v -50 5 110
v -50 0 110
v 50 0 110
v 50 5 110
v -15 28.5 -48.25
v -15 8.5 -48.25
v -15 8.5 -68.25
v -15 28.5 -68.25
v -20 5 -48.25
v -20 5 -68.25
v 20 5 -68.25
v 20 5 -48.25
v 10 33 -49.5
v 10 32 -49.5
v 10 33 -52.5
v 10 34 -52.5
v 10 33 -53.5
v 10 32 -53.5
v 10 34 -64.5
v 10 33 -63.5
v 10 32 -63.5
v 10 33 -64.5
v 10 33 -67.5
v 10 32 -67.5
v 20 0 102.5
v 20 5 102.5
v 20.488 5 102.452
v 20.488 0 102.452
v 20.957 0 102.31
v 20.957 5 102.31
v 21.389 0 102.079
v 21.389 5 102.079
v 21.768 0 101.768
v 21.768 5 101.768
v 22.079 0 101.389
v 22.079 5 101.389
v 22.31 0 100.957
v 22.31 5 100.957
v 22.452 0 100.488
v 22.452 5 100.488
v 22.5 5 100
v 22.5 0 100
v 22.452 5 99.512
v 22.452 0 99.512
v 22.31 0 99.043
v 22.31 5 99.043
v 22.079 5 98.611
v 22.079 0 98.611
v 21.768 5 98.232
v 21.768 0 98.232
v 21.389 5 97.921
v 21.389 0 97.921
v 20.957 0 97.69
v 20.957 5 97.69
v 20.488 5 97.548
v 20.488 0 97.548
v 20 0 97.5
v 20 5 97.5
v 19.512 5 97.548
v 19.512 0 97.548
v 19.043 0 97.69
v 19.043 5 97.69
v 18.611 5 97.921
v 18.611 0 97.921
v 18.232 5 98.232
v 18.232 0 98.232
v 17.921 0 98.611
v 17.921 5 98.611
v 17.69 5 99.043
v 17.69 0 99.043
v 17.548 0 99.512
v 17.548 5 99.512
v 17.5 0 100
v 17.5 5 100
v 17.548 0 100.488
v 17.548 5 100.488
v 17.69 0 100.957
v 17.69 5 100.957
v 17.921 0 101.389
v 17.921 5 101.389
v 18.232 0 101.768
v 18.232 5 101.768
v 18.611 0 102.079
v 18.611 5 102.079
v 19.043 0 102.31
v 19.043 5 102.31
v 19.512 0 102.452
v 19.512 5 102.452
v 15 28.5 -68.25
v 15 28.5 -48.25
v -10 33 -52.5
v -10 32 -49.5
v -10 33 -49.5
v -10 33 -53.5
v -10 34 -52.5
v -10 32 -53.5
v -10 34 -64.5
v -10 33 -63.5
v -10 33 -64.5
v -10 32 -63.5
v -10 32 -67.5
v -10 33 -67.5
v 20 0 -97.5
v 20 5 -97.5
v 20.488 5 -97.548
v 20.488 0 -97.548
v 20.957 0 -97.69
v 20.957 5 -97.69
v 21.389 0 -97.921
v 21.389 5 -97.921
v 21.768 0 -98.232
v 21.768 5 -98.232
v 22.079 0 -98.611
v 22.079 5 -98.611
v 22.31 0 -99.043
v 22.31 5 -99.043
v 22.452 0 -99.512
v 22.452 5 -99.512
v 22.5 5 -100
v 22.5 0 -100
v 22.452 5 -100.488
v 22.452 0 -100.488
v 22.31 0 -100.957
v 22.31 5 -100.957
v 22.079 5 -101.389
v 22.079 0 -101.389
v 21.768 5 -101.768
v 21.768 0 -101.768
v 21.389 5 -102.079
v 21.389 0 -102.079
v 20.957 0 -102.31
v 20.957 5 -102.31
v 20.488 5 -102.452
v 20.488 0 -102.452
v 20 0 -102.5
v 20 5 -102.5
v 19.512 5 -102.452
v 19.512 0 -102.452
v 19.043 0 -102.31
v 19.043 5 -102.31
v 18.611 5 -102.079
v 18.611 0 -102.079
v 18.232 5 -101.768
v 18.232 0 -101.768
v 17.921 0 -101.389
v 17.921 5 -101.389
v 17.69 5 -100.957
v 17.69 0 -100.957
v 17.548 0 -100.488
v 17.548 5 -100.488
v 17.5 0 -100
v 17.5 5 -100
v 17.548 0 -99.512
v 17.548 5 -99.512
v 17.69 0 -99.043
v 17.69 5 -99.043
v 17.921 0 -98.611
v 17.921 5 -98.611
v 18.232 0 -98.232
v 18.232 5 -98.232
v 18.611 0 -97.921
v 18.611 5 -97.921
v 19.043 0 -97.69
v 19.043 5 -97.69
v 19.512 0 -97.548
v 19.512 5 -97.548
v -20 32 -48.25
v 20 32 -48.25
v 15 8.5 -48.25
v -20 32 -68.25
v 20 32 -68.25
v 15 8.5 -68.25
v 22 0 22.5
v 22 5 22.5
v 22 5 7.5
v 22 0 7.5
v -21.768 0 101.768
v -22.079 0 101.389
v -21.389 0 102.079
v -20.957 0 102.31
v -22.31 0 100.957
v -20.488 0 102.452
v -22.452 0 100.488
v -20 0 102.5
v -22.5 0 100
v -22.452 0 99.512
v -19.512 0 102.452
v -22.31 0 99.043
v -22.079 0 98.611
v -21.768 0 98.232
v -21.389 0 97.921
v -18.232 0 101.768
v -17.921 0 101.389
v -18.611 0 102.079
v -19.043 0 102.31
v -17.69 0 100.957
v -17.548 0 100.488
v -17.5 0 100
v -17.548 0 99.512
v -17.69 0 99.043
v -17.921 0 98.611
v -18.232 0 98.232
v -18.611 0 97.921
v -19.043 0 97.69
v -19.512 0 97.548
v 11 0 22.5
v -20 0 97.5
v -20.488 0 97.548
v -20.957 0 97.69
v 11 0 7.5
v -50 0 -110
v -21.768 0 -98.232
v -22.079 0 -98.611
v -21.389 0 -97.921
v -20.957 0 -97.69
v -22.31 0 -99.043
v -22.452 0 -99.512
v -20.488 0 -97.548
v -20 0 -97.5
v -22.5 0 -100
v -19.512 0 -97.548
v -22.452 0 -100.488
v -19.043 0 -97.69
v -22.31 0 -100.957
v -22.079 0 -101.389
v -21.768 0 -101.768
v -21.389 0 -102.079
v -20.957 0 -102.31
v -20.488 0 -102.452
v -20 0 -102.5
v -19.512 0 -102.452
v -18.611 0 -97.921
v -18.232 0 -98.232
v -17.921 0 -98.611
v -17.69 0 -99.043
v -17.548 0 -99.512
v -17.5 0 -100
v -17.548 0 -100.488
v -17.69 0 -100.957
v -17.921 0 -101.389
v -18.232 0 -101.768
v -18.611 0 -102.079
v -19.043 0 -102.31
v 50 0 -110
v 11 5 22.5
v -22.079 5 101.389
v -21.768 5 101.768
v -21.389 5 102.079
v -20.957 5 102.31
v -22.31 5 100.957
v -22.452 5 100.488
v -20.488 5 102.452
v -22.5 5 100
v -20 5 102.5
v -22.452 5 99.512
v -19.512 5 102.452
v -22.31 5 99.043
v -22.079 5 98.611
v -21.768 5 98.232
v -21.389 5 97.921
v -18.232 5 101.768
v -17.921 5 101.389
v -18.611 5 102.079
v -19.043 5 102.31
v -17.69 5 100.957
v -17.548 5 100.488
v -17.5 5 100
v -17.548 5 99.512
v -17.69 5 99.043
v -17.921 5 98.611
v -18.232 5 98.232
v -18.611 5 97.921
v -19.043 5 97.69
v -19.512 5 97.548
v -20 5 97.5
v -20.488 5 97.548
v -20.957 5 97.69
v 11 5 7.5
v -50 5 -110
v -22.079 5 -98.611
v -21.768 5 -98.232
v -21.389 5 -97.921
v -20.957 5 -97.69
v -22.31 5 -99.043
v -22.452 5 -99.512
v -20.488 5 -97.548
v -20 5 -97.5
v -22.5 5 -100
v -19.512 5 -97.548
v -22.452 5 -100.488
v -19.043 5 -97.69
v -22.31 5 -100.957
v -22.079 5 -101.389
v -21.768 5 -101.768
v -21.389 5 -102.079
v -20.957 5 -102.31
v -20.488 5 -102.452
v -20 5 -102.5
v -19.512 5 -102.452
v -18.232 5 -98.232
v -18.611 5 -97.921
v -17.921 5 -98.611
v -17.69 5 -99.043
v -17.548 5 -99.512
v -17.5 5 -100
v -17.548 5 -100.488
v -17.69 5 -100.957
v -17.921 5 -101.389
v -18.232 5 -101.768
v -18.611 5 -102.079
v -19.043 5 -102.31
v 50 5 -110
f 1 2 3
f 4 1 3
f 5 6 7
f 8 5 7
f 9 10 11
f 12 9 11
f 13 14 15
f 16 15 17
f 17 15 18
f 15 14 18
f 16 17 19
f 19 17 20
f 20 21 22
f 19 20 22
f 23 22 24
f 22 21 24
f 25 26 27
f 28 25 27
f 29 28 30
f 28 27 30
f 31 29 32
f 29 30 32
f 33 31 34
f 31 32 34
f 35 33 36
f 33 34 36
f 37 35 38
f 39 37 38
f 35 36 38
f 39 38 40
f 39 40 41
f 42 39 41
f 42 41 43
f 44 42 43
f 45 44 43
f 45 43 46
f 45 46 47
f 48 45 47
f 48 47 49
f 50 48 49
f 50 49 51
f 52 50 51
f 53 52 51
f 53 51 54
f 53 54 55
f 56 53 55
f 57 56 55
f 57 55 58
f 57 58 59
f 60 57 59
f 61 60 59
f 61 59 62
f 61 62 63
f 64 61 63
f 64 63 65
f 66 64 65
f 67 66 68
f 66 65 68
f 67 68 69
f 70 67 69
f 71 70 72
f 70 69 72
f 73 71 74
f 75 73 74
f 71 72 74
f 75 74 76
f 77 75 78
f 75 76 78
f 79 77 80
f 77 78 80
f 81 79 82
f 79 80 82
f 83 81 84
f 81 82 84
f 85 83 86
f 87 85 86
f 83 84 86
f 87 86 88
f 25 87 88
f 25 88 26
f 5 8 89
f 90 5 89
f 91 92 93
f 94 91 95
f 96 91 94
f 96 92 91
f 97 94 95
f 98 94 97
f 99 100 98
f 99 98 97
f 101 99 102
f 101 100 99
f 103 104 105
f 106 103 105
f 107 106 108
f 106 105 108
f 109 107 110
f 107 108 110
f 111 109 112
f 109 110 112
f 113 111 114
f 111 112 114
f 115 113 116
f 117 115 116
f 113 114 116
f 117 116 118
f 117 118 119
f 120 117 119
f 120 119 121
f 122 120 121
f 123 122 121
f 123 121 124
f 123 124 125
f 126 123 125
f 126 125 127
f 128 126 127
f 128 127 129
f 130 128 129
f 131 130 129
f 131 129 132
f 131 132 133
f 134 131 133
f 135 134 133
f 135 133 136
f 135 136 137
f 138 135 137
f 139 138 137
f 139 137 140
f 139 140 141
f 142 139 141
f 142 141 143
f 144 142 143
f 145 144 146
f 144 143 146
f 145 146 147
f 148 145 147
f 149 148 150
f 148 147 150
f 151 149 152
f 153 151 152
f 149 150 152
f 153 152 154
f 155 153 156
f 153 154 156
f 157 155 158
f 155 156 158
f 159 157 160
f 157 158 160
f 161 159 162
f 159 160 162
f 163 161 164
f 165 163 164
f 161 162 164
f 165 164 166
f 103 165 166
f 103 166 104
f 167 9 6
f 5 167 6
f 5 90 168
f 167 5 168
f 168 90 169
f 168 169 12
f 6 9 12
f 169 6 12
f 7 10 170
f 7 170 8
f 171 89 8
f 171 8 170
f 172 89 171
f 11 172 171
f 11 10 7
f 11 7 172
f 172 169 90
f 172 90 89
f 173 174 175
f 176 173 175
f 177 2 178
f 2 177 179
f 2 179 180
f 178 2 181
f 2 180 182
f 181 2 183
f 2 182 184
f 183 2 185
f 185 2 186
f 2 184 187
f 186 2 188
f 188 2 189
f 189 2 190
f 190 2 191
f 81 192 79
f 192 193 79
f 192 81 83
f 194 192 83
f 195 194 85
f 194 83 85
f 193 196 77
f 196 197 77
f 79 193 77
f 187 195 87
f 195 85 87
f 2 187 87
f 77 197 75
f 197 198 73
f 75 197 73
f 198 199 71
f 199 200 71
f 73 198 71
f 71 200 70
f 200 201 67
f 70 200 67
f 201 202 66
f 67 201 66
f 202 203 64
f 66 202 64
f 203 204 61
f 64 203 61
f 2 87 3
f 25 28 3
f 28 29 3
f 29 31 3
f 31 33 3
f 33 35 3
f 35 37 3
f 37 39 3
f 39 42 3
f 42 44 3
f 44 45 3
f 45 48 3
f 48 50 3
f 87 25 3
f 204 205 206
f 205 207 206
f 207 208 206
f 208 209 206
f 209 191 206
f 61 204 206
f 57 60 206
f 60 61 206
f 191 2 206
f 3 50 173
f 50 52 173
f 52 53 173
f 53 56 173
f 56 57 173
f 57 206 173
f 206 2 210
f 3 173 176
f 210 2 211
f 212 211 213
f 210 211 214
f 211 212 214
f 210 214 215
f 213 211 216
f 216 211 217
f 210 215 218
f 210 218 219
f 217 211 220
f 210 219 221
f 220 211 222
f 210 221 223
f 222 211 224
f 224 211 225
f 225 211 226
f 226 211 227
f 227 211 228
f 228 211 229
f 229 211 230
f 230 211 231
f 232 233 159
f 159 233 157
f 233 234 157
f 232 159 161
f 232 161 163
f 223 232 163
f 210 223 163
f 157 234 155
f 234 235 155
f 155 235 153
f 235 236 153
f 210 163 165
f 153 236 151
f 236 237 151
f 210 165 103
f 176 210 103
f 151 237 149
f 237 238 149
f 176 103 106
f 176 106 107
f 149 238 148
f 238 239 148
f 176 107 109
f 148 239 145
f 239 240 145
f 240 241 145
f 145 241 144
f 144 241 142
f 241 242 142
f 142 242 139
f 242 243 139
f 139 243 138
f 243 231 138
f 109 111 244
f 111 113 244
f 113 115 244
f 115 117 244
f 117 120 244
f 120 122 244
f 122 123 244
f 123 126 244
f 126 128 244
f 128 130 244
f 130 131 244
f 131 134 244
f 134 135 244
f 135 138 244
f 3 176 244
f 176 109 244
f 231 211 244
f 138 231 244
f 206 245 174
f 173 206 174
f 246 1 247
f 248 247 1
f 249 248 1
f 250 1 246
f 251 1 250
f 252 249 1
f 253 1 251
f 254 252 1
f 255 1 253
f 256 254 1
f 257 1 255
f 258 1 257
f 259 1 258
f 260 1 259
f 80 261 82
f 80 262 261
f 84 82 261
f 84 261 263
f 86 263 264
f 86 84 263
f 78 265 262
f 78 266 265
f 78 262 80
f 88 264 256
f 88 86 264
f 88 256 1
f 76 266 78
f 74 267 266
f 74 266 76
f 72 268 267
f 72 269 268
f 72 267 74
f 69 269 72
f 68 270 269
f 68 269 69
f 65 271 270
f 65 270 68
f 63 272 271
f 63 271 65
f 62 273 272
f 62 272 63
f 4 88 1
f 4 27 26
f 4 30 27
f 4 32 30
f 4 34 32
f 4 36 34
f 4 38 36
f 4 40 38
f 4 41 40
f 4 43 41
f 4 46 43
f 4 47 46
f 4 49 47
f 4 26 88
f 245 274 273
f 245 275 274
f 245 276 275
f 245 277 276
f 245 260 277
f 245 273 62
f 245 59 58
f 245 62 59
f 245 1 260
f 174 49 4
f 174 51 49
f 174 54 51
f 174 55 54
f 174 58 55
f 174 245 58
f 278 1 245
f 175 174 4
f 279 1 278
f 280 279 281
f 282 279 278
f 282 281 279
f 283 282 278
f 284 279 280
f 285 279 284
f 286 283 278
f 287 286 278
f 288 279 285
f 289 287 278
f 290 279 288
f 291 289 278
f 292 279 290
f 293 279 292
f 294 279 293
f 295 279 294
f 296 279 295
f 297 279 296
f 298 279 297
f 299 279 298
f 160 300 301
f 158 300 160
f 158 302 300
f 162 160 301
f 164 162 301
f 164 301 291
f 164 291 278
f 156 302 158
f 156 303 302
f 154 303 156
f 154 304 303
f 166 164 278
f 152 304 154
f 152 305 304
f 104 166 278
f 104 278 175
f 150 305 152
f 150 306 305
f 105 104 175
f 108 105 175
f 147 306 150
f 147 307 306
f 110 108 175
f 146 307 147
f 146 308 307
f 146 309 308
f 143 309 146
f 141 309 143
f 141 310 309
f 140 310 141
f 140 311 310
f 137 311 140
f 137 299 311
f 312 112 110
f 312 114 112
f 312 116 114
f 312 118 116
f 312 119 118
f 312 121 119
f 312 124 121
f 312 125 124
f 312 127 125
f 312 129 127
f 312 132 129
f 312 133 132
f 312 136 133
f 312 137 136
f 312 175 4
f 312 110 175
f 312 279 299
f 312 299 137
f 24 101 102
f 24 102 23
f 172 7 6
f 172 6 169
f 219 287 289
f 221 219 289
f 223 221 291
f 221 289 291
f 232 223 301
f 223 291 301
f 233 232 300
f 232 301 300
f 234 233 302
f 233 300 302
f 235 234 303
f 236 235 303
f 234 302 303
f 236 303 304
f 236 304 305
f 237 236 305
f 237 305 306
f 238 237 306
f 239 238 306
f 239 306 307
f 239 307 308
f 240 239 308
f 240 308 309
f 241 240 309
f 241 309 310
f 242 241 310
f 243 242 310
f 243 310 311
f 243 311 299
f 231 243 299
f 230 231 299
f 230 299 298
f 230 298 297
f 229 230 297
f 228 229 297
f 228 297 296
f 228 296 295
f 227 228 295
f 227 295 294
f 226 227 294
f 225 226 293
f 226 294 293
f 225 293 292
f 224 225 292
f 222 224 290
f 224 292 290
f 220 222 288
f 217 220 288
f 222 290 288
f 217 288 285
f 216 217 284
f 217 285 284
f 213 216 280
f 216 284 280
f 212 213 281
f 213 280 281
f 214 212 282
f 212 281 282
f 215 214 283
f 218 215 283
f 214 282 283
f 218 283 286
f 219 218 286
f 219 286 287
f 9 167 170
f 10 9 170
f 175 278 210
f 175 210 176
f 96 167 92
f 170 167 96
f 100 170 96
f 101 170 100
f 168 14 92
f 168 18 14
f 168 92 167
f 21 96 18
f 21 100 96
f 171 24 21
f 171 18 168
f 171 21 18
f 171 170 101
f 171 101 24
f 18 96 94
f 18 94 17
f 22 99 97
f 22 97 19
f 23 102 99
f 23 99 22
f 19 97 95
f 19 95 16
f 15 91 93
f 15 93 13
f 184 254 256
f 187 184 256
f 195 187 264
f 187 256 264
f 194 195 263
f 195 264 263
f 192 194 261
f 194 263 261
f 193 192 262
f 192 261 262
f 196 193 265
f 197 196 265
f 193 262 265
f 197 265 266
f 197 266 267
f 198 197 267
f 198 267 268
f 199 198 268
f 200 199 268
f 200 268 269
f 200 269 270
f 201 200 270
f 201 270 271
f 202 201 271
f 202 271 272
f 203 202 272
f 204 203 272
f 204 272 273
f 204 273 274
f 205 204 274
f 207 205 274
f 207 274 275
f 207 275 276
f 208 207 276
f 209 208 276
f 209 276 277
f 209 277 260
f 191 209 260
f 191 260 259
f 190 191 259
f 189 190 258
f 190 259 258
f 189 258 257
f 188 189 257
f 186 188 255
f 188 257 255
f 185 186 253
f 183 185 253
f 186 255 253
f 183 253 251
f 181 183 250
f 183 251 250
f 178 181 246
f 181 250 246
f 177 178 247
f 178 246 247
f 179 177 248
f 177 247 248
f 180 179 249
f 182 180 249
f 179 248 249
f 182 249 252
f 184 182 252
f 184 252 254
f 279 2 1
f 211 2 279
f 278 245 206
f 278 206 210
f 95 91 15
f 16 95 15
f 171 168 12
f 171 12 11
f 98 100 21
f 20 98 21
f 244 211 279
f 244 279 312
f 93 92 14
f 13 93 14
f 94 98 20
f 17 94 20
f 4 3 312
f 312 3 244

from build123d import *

# Parameters (mm, degrees)
SKETCH_1_W                 = 100
SKETCH_1_H                 = 220
EXTRUDE_1_DEPTH            = 5
CUT_EXTRUDE_1_REACH        = 122.934
SKETCH_2_R                 = 2.5
CUT_EXTRUDE_2_REACH        = 122.934
SKETCH_3_W                 = 11
SKETCH_3_H                 = 15
SKETCH_5_W                 = 20
SKETCH_5_H                 = 27
EXTRUDE_2_DEPTH            = 20
EXTRUDE_START              = -10
EXTRUDE_1_2_DEPTH          = 20
CUT_EXTRUDE_3_REACH        = 190.226
SKETCH_7_W                 = 30
SKETCH_7_H                 = 20
SPLIT_START                = 5
SPLIT_BODIES_2_OUTLINE_W   = 40
SPLIT_BODIES_2_OUTLINE_H   = 20
SPLIT_BODIES_2_DEPTH       = 29
SPLIT_BODIES_2_2_OUTLINE_W = 5
SPLIT_BODIES_2_2_OUTLINE_H = 20
SPLIT_BODIES_2_2_DEPTH     = 27
SPLIT_BODIES_2_3_OUTLINE_W = 30
SPLIT_BODIES_2_3_OUTLINE_H = 20
SPLIT_BODIES_2_3_DEPTH     = 3.5
SPLIT_START_2              = 28.5
SPLIT_BODIES_2_4_OUTLINE_W = 30
SPLIT_BODIES_2_4_OUTLINE_H = 20
SPLIT_BODIES_2_4_DEPTH     = 3.5
SPLIT_START_3              = 33
SPLIT_BODIES_2_5_OUTLINE_W = 20
SPLIT_BODIES_2_5_OUTLINE_H = 12
SPLIT_BODIES_2_5_DEPTH     = 1
SPLIT_START_4              = 32
SPLIT_BODIES_2_6_OUTLINE_W = 20
SPLIT_BODIES_2_6_OUTLINE_H = 4
SPLIT_BODIES_2_6_DEPTH     = 1


# Read off the part's stored shape, not the designer's step: 拉伸-薄壁1, 分割2
with BuildPart() as part:
    # 草图1 → Extrude 1 (new body)
    with BuildSketch(Plane(origin=(0, 0, 0), x_dir=(1, 0, 0), z_dir=(0, 1, 0))):
        Rectangle(SKETCH_1_W, SKETCH_1_H)
    extrude(amount=EXTRUDE_1_DEPTH)

    # 草图2 → 切除-拉伸1 (cut, up to next)
    with BuildSketch(Plane(origin=(0, 5, 0), x_dir=(1, 0, 0), z_dir=(0, 1, 0)), mode=Mode.PRIVATE) as cut_extrude_1_sk1:
        with Locations(Location((-20, 100, 0), (0, 0, 270))):
            Circle(SKETCH_2_R)
    cut_extrude_1_tool1 = extrude(cut_extrude_1_sk1.sketch, amount=-CUT_EXTRUDE_1_REACH, mode=Mode.PRIVATE) & part.part
    # 草图2 → 切除-拉伸1 (cut, up to next)
    with BuildSketch(Plane(origin=(0, 5, 0), x_dir=(1, 0, 0), z_dir=(0, 1, 0)), mode=Mode.PRIVATE) as cut_extrude_1_sk2:
        with Locations(Location((-20, -100, 0), (0, 0, 270))):
            Circle(SKETCH_2_R)
    cut_extrude_1_tool2 = extrude(cut_extrude_1_sk2.sketch, amount=-CUT_EXTRUDE_1_REACH, mode=Mode.PRIVATE) & part.part
    # 草图2 → 切除-拉伸1 (cut, up to next)
    with BuildSketch(Plane(origin=(0, 5, 0), x_dir=(1, 0, 0), z_dir=(0, 1, 0)), mode=Mode.PRIVATE) as cut_extrude_1_sk3:
        with Locations(Location((20, 100, 0), (0, 0, 270))):
            Circle(SKETCH_2_R)
    cut_extrude_1_tool3 = extrude(cut_extrude_1_sk3.sketch, amount=-CUT_EXTRUDE_1_REACH, mode=Mode.PRIVATE) & part.part
    # 草图2 → 切除-拉伸1 (cut, up to next)
    with BuildSketch(Plane(origin=(0, 5, 0), x_dir=(1, 0, 0), z_dir=(0, 1, 0)), mode=Mode.PRIVATE) as cut_extrude_1_sk4:
        with Locations(Location((20, -100, 0), (0, 0, 270))):
            Circle(SKETCH_2_R)
    cut_extrude_1_tool4 = extrude(cut_extrude_1_sk4.sketch, amount=-CUT_EXTRUDE_1_REACH, mode=Mode.PRIVATE) & part.part
    add(cut_extrude_1_tool1.solids().sort_by_distance((-20, 5, -100))[0], mode=Mode.SUBTRACT)
    add(cut_extrude_1_tool2.solids().sort_by_distance((-20, 5, 100))[0], mode=Mode.SUBTRACT)
    add(cut_extrude_1_tool3.solids().sort_by_distance((20, 5, -100))[0], mode=Mode.SUBTRACT)
    add(cut_extrude_1_tool4.solids().sort_by_distance((20, 5, 100))[0], mode=Mode.SUBTRACT)

    # 草图3 → 切除-拉伸2 (cut, up to next)
    with BuildSketch(Plane(origin=(0, 5, 0), x_dir=(1, 0, 0), z_dir=(0, 1, 0)), mode=Mode.PRIVATE) as cut_extrude_2_sk1:
        with Locations((16.5, -15)):
            Rectangle(SKETCH_3_W, SKETCH_3_H)
    cut_extrude_2_tool1 = extrude(cut_extrude_2_sk1.sketch, amount=-CUT_EXTRUDE_2_REACH, mode=Mode.PRIVATE) & part.part
    add(cut_extrude_2_tool1.solids().sort_by_distance((16.5, 5, 15))[0], mode=Mode.SUBTRACT)

    # 草图5 → 凸台-拉伸2 (add, symmetric)
    with BuildSketch(Plane(origin=(0, 0, 0), x_dir=(0, 0, -1), z_dir=(1, 0, 0))):
        with Locations((58.25, 18.5)):
            Rectangle(SKETCH_5_W, SKETCH_5_H)
    extrude(amount=EXTRUDE_2_DEPTH, both=True)

    # Extrude 1 2 outline → Extrude 1 2 (add)
    with BuildSketch(Plane(origin=(0, 0, 0), x_dir=(0, 0, -1), z_dir=(1, 0, 0)).offset(EXTRUDE_START)):
        Polygon((49.5, 33), (49.5, 32), (53.5, 32), (53.5, 33), (63.5, 33), (63.5, 32), (67.5, 32), (67.5, 33), (64.5, 33), (64.5, 34), (52.5, 34), (52.5, 33), align=None)
    extrude(amount=EXTRUDE_1_2_DEPTH)

    # 草图7 → 切除-拉伸3 (cut, up to next)
    with BuildSketch(Plane(origin=(0, 0, -68.25), x_dir=(-1, 0, 0), z_dir=(0, 0, -1)), mode=Mode.PRIVATE) as cut_extrude_3_sk1:
        with Locations((0, 18.5)):
            Rectangle(SKETCH_7_W, SKETCH_7_H)
    cut_extrude_3_tool1 = extrude(cut_extrude_3_sk1.sketch, amount=-CUT_EXTRUDE_3_REACH, mode=Mode.PRIVATE) & part.part
    add(cut_extrude_3_tool1.solids().sort_by_distance((0, 18.5, -68.25))[0], mode=Mode.SUBTRACT)

    # Split Bodies 2 outline → Split Bodies 2 (cut)
    with BuildSketch(Plane(origin=(0, 0, 0), x_dir=(1, 0, 0), z_dir=(0, 1, 0)).offset(SPLIT_START)):
        with Locations((0, 58.25)):
            Rectangle(SPLIT_BODIES_2_OUTLINE_W, SPLIT_BODIES_2_OUTLINE_H)
    extrude(amount=SPLIT_BODIES_2_DEPTH, mode=Mode.SUBTRACT)


with BuildPart() as body_2:
    # Split Bodies 2 2 outline → Split Bodies 2 2 (new body)
    with BuildSketch(Plane(origin=(0, 0, 0), x_dir=(1, 0, 0), z_dir=(0, 1, 0)).offset(SPLIT_START)):
        with Locations((17.5, 58.25)):
            Rectangle(SPLIT_BODIES_2_2_OUTLINE_W, SPLIT_BODIES_2_2_OUTLINE_H)
        with Locations((-17.5, 58.25)):
            Rectangle(SPLIT_BODIES_2_2_OUTLINE_W, SPLIT_BODIES_2_2_OUTLINE_H)
    extrude(amount=SPLIT_BODIES_2_2_DEPTH)

    # Split Bodies 2 3 outline → Split Bodies 2 3 (add)
    with BuildSketch(Plane(origin=(0, 0, 0), x_dir=(1, 0, 0), z_dir=(0, 1, 0)).offset(SPLIT_START)):
        with Locations((0, 58.25)):
            Rectangle(SPLIT_BODIES_2_3_OUTLINE_W, SPLIT_BODIES_2_3_OUTLINE_H)
    extrude(amount=SPLIT_BODIES_2_3_DEPTH)

    # Split Bodies 2 4 outline → Split Bodies 2 4 (add)
    with BuildSketch(Plane(origin=(0, 0, 0), x_dir=(1, 0, 0), z_dir=(0, 1, 0)).offset(SPLIT_START_2)):
        with Locations((0, 58.25)):
            Rectangle(SPLIT_BODIES_2_4_OUTLINE_W, SPLIT_BODIES_2_4_OUTLINE_H)
    extrude(amount=SPLIT_BODIES_2_4_DEPTH)

    # Split Bodies 2 5 outline → Split Bodies 2 5 (add)
    with BuildSketch(Plane(origin=(0, 0, 0), x_dir=(1, 0, 0), z_dir=(0, 1, 0)).offset(SPLIT_START_3)):
        with Locations((0, 58.5)):
            Rectangle(SPLIT_BODIES_2_5_OUTLINE_W, SPLIT_BODIES_2_5_OUTLINE_H)
    extrude(amount=SPLIT_BODIES_2_5_DEPTH)

    # Split Bodies 2 6 outline → Split Bodies 2 6 (add)
    with BuildSketch(Plane(origin=(0, 0, 0), x_dir=(1, 0, 0), z_dir=(0, 1, 0)).offset(SPLIT_START_4)):
        with Locations((0, 51.5)):
            Rectangle(SPLIT_BODIES_2_6_OUTLINE_W, SPLIT_BODIES_2_6_OUTLINE_H)
        with Locations((0, 65.5)):
            Rectangle(SPLIT_BODIES_2_6_OUTLINE_W, SPLIT_BODIES_2_6_OUTLINE_H)
    extrude(amount=SPLIT_BODIES_2_6_DEPTH)


solid = Compound([part.part, body_2.part])
